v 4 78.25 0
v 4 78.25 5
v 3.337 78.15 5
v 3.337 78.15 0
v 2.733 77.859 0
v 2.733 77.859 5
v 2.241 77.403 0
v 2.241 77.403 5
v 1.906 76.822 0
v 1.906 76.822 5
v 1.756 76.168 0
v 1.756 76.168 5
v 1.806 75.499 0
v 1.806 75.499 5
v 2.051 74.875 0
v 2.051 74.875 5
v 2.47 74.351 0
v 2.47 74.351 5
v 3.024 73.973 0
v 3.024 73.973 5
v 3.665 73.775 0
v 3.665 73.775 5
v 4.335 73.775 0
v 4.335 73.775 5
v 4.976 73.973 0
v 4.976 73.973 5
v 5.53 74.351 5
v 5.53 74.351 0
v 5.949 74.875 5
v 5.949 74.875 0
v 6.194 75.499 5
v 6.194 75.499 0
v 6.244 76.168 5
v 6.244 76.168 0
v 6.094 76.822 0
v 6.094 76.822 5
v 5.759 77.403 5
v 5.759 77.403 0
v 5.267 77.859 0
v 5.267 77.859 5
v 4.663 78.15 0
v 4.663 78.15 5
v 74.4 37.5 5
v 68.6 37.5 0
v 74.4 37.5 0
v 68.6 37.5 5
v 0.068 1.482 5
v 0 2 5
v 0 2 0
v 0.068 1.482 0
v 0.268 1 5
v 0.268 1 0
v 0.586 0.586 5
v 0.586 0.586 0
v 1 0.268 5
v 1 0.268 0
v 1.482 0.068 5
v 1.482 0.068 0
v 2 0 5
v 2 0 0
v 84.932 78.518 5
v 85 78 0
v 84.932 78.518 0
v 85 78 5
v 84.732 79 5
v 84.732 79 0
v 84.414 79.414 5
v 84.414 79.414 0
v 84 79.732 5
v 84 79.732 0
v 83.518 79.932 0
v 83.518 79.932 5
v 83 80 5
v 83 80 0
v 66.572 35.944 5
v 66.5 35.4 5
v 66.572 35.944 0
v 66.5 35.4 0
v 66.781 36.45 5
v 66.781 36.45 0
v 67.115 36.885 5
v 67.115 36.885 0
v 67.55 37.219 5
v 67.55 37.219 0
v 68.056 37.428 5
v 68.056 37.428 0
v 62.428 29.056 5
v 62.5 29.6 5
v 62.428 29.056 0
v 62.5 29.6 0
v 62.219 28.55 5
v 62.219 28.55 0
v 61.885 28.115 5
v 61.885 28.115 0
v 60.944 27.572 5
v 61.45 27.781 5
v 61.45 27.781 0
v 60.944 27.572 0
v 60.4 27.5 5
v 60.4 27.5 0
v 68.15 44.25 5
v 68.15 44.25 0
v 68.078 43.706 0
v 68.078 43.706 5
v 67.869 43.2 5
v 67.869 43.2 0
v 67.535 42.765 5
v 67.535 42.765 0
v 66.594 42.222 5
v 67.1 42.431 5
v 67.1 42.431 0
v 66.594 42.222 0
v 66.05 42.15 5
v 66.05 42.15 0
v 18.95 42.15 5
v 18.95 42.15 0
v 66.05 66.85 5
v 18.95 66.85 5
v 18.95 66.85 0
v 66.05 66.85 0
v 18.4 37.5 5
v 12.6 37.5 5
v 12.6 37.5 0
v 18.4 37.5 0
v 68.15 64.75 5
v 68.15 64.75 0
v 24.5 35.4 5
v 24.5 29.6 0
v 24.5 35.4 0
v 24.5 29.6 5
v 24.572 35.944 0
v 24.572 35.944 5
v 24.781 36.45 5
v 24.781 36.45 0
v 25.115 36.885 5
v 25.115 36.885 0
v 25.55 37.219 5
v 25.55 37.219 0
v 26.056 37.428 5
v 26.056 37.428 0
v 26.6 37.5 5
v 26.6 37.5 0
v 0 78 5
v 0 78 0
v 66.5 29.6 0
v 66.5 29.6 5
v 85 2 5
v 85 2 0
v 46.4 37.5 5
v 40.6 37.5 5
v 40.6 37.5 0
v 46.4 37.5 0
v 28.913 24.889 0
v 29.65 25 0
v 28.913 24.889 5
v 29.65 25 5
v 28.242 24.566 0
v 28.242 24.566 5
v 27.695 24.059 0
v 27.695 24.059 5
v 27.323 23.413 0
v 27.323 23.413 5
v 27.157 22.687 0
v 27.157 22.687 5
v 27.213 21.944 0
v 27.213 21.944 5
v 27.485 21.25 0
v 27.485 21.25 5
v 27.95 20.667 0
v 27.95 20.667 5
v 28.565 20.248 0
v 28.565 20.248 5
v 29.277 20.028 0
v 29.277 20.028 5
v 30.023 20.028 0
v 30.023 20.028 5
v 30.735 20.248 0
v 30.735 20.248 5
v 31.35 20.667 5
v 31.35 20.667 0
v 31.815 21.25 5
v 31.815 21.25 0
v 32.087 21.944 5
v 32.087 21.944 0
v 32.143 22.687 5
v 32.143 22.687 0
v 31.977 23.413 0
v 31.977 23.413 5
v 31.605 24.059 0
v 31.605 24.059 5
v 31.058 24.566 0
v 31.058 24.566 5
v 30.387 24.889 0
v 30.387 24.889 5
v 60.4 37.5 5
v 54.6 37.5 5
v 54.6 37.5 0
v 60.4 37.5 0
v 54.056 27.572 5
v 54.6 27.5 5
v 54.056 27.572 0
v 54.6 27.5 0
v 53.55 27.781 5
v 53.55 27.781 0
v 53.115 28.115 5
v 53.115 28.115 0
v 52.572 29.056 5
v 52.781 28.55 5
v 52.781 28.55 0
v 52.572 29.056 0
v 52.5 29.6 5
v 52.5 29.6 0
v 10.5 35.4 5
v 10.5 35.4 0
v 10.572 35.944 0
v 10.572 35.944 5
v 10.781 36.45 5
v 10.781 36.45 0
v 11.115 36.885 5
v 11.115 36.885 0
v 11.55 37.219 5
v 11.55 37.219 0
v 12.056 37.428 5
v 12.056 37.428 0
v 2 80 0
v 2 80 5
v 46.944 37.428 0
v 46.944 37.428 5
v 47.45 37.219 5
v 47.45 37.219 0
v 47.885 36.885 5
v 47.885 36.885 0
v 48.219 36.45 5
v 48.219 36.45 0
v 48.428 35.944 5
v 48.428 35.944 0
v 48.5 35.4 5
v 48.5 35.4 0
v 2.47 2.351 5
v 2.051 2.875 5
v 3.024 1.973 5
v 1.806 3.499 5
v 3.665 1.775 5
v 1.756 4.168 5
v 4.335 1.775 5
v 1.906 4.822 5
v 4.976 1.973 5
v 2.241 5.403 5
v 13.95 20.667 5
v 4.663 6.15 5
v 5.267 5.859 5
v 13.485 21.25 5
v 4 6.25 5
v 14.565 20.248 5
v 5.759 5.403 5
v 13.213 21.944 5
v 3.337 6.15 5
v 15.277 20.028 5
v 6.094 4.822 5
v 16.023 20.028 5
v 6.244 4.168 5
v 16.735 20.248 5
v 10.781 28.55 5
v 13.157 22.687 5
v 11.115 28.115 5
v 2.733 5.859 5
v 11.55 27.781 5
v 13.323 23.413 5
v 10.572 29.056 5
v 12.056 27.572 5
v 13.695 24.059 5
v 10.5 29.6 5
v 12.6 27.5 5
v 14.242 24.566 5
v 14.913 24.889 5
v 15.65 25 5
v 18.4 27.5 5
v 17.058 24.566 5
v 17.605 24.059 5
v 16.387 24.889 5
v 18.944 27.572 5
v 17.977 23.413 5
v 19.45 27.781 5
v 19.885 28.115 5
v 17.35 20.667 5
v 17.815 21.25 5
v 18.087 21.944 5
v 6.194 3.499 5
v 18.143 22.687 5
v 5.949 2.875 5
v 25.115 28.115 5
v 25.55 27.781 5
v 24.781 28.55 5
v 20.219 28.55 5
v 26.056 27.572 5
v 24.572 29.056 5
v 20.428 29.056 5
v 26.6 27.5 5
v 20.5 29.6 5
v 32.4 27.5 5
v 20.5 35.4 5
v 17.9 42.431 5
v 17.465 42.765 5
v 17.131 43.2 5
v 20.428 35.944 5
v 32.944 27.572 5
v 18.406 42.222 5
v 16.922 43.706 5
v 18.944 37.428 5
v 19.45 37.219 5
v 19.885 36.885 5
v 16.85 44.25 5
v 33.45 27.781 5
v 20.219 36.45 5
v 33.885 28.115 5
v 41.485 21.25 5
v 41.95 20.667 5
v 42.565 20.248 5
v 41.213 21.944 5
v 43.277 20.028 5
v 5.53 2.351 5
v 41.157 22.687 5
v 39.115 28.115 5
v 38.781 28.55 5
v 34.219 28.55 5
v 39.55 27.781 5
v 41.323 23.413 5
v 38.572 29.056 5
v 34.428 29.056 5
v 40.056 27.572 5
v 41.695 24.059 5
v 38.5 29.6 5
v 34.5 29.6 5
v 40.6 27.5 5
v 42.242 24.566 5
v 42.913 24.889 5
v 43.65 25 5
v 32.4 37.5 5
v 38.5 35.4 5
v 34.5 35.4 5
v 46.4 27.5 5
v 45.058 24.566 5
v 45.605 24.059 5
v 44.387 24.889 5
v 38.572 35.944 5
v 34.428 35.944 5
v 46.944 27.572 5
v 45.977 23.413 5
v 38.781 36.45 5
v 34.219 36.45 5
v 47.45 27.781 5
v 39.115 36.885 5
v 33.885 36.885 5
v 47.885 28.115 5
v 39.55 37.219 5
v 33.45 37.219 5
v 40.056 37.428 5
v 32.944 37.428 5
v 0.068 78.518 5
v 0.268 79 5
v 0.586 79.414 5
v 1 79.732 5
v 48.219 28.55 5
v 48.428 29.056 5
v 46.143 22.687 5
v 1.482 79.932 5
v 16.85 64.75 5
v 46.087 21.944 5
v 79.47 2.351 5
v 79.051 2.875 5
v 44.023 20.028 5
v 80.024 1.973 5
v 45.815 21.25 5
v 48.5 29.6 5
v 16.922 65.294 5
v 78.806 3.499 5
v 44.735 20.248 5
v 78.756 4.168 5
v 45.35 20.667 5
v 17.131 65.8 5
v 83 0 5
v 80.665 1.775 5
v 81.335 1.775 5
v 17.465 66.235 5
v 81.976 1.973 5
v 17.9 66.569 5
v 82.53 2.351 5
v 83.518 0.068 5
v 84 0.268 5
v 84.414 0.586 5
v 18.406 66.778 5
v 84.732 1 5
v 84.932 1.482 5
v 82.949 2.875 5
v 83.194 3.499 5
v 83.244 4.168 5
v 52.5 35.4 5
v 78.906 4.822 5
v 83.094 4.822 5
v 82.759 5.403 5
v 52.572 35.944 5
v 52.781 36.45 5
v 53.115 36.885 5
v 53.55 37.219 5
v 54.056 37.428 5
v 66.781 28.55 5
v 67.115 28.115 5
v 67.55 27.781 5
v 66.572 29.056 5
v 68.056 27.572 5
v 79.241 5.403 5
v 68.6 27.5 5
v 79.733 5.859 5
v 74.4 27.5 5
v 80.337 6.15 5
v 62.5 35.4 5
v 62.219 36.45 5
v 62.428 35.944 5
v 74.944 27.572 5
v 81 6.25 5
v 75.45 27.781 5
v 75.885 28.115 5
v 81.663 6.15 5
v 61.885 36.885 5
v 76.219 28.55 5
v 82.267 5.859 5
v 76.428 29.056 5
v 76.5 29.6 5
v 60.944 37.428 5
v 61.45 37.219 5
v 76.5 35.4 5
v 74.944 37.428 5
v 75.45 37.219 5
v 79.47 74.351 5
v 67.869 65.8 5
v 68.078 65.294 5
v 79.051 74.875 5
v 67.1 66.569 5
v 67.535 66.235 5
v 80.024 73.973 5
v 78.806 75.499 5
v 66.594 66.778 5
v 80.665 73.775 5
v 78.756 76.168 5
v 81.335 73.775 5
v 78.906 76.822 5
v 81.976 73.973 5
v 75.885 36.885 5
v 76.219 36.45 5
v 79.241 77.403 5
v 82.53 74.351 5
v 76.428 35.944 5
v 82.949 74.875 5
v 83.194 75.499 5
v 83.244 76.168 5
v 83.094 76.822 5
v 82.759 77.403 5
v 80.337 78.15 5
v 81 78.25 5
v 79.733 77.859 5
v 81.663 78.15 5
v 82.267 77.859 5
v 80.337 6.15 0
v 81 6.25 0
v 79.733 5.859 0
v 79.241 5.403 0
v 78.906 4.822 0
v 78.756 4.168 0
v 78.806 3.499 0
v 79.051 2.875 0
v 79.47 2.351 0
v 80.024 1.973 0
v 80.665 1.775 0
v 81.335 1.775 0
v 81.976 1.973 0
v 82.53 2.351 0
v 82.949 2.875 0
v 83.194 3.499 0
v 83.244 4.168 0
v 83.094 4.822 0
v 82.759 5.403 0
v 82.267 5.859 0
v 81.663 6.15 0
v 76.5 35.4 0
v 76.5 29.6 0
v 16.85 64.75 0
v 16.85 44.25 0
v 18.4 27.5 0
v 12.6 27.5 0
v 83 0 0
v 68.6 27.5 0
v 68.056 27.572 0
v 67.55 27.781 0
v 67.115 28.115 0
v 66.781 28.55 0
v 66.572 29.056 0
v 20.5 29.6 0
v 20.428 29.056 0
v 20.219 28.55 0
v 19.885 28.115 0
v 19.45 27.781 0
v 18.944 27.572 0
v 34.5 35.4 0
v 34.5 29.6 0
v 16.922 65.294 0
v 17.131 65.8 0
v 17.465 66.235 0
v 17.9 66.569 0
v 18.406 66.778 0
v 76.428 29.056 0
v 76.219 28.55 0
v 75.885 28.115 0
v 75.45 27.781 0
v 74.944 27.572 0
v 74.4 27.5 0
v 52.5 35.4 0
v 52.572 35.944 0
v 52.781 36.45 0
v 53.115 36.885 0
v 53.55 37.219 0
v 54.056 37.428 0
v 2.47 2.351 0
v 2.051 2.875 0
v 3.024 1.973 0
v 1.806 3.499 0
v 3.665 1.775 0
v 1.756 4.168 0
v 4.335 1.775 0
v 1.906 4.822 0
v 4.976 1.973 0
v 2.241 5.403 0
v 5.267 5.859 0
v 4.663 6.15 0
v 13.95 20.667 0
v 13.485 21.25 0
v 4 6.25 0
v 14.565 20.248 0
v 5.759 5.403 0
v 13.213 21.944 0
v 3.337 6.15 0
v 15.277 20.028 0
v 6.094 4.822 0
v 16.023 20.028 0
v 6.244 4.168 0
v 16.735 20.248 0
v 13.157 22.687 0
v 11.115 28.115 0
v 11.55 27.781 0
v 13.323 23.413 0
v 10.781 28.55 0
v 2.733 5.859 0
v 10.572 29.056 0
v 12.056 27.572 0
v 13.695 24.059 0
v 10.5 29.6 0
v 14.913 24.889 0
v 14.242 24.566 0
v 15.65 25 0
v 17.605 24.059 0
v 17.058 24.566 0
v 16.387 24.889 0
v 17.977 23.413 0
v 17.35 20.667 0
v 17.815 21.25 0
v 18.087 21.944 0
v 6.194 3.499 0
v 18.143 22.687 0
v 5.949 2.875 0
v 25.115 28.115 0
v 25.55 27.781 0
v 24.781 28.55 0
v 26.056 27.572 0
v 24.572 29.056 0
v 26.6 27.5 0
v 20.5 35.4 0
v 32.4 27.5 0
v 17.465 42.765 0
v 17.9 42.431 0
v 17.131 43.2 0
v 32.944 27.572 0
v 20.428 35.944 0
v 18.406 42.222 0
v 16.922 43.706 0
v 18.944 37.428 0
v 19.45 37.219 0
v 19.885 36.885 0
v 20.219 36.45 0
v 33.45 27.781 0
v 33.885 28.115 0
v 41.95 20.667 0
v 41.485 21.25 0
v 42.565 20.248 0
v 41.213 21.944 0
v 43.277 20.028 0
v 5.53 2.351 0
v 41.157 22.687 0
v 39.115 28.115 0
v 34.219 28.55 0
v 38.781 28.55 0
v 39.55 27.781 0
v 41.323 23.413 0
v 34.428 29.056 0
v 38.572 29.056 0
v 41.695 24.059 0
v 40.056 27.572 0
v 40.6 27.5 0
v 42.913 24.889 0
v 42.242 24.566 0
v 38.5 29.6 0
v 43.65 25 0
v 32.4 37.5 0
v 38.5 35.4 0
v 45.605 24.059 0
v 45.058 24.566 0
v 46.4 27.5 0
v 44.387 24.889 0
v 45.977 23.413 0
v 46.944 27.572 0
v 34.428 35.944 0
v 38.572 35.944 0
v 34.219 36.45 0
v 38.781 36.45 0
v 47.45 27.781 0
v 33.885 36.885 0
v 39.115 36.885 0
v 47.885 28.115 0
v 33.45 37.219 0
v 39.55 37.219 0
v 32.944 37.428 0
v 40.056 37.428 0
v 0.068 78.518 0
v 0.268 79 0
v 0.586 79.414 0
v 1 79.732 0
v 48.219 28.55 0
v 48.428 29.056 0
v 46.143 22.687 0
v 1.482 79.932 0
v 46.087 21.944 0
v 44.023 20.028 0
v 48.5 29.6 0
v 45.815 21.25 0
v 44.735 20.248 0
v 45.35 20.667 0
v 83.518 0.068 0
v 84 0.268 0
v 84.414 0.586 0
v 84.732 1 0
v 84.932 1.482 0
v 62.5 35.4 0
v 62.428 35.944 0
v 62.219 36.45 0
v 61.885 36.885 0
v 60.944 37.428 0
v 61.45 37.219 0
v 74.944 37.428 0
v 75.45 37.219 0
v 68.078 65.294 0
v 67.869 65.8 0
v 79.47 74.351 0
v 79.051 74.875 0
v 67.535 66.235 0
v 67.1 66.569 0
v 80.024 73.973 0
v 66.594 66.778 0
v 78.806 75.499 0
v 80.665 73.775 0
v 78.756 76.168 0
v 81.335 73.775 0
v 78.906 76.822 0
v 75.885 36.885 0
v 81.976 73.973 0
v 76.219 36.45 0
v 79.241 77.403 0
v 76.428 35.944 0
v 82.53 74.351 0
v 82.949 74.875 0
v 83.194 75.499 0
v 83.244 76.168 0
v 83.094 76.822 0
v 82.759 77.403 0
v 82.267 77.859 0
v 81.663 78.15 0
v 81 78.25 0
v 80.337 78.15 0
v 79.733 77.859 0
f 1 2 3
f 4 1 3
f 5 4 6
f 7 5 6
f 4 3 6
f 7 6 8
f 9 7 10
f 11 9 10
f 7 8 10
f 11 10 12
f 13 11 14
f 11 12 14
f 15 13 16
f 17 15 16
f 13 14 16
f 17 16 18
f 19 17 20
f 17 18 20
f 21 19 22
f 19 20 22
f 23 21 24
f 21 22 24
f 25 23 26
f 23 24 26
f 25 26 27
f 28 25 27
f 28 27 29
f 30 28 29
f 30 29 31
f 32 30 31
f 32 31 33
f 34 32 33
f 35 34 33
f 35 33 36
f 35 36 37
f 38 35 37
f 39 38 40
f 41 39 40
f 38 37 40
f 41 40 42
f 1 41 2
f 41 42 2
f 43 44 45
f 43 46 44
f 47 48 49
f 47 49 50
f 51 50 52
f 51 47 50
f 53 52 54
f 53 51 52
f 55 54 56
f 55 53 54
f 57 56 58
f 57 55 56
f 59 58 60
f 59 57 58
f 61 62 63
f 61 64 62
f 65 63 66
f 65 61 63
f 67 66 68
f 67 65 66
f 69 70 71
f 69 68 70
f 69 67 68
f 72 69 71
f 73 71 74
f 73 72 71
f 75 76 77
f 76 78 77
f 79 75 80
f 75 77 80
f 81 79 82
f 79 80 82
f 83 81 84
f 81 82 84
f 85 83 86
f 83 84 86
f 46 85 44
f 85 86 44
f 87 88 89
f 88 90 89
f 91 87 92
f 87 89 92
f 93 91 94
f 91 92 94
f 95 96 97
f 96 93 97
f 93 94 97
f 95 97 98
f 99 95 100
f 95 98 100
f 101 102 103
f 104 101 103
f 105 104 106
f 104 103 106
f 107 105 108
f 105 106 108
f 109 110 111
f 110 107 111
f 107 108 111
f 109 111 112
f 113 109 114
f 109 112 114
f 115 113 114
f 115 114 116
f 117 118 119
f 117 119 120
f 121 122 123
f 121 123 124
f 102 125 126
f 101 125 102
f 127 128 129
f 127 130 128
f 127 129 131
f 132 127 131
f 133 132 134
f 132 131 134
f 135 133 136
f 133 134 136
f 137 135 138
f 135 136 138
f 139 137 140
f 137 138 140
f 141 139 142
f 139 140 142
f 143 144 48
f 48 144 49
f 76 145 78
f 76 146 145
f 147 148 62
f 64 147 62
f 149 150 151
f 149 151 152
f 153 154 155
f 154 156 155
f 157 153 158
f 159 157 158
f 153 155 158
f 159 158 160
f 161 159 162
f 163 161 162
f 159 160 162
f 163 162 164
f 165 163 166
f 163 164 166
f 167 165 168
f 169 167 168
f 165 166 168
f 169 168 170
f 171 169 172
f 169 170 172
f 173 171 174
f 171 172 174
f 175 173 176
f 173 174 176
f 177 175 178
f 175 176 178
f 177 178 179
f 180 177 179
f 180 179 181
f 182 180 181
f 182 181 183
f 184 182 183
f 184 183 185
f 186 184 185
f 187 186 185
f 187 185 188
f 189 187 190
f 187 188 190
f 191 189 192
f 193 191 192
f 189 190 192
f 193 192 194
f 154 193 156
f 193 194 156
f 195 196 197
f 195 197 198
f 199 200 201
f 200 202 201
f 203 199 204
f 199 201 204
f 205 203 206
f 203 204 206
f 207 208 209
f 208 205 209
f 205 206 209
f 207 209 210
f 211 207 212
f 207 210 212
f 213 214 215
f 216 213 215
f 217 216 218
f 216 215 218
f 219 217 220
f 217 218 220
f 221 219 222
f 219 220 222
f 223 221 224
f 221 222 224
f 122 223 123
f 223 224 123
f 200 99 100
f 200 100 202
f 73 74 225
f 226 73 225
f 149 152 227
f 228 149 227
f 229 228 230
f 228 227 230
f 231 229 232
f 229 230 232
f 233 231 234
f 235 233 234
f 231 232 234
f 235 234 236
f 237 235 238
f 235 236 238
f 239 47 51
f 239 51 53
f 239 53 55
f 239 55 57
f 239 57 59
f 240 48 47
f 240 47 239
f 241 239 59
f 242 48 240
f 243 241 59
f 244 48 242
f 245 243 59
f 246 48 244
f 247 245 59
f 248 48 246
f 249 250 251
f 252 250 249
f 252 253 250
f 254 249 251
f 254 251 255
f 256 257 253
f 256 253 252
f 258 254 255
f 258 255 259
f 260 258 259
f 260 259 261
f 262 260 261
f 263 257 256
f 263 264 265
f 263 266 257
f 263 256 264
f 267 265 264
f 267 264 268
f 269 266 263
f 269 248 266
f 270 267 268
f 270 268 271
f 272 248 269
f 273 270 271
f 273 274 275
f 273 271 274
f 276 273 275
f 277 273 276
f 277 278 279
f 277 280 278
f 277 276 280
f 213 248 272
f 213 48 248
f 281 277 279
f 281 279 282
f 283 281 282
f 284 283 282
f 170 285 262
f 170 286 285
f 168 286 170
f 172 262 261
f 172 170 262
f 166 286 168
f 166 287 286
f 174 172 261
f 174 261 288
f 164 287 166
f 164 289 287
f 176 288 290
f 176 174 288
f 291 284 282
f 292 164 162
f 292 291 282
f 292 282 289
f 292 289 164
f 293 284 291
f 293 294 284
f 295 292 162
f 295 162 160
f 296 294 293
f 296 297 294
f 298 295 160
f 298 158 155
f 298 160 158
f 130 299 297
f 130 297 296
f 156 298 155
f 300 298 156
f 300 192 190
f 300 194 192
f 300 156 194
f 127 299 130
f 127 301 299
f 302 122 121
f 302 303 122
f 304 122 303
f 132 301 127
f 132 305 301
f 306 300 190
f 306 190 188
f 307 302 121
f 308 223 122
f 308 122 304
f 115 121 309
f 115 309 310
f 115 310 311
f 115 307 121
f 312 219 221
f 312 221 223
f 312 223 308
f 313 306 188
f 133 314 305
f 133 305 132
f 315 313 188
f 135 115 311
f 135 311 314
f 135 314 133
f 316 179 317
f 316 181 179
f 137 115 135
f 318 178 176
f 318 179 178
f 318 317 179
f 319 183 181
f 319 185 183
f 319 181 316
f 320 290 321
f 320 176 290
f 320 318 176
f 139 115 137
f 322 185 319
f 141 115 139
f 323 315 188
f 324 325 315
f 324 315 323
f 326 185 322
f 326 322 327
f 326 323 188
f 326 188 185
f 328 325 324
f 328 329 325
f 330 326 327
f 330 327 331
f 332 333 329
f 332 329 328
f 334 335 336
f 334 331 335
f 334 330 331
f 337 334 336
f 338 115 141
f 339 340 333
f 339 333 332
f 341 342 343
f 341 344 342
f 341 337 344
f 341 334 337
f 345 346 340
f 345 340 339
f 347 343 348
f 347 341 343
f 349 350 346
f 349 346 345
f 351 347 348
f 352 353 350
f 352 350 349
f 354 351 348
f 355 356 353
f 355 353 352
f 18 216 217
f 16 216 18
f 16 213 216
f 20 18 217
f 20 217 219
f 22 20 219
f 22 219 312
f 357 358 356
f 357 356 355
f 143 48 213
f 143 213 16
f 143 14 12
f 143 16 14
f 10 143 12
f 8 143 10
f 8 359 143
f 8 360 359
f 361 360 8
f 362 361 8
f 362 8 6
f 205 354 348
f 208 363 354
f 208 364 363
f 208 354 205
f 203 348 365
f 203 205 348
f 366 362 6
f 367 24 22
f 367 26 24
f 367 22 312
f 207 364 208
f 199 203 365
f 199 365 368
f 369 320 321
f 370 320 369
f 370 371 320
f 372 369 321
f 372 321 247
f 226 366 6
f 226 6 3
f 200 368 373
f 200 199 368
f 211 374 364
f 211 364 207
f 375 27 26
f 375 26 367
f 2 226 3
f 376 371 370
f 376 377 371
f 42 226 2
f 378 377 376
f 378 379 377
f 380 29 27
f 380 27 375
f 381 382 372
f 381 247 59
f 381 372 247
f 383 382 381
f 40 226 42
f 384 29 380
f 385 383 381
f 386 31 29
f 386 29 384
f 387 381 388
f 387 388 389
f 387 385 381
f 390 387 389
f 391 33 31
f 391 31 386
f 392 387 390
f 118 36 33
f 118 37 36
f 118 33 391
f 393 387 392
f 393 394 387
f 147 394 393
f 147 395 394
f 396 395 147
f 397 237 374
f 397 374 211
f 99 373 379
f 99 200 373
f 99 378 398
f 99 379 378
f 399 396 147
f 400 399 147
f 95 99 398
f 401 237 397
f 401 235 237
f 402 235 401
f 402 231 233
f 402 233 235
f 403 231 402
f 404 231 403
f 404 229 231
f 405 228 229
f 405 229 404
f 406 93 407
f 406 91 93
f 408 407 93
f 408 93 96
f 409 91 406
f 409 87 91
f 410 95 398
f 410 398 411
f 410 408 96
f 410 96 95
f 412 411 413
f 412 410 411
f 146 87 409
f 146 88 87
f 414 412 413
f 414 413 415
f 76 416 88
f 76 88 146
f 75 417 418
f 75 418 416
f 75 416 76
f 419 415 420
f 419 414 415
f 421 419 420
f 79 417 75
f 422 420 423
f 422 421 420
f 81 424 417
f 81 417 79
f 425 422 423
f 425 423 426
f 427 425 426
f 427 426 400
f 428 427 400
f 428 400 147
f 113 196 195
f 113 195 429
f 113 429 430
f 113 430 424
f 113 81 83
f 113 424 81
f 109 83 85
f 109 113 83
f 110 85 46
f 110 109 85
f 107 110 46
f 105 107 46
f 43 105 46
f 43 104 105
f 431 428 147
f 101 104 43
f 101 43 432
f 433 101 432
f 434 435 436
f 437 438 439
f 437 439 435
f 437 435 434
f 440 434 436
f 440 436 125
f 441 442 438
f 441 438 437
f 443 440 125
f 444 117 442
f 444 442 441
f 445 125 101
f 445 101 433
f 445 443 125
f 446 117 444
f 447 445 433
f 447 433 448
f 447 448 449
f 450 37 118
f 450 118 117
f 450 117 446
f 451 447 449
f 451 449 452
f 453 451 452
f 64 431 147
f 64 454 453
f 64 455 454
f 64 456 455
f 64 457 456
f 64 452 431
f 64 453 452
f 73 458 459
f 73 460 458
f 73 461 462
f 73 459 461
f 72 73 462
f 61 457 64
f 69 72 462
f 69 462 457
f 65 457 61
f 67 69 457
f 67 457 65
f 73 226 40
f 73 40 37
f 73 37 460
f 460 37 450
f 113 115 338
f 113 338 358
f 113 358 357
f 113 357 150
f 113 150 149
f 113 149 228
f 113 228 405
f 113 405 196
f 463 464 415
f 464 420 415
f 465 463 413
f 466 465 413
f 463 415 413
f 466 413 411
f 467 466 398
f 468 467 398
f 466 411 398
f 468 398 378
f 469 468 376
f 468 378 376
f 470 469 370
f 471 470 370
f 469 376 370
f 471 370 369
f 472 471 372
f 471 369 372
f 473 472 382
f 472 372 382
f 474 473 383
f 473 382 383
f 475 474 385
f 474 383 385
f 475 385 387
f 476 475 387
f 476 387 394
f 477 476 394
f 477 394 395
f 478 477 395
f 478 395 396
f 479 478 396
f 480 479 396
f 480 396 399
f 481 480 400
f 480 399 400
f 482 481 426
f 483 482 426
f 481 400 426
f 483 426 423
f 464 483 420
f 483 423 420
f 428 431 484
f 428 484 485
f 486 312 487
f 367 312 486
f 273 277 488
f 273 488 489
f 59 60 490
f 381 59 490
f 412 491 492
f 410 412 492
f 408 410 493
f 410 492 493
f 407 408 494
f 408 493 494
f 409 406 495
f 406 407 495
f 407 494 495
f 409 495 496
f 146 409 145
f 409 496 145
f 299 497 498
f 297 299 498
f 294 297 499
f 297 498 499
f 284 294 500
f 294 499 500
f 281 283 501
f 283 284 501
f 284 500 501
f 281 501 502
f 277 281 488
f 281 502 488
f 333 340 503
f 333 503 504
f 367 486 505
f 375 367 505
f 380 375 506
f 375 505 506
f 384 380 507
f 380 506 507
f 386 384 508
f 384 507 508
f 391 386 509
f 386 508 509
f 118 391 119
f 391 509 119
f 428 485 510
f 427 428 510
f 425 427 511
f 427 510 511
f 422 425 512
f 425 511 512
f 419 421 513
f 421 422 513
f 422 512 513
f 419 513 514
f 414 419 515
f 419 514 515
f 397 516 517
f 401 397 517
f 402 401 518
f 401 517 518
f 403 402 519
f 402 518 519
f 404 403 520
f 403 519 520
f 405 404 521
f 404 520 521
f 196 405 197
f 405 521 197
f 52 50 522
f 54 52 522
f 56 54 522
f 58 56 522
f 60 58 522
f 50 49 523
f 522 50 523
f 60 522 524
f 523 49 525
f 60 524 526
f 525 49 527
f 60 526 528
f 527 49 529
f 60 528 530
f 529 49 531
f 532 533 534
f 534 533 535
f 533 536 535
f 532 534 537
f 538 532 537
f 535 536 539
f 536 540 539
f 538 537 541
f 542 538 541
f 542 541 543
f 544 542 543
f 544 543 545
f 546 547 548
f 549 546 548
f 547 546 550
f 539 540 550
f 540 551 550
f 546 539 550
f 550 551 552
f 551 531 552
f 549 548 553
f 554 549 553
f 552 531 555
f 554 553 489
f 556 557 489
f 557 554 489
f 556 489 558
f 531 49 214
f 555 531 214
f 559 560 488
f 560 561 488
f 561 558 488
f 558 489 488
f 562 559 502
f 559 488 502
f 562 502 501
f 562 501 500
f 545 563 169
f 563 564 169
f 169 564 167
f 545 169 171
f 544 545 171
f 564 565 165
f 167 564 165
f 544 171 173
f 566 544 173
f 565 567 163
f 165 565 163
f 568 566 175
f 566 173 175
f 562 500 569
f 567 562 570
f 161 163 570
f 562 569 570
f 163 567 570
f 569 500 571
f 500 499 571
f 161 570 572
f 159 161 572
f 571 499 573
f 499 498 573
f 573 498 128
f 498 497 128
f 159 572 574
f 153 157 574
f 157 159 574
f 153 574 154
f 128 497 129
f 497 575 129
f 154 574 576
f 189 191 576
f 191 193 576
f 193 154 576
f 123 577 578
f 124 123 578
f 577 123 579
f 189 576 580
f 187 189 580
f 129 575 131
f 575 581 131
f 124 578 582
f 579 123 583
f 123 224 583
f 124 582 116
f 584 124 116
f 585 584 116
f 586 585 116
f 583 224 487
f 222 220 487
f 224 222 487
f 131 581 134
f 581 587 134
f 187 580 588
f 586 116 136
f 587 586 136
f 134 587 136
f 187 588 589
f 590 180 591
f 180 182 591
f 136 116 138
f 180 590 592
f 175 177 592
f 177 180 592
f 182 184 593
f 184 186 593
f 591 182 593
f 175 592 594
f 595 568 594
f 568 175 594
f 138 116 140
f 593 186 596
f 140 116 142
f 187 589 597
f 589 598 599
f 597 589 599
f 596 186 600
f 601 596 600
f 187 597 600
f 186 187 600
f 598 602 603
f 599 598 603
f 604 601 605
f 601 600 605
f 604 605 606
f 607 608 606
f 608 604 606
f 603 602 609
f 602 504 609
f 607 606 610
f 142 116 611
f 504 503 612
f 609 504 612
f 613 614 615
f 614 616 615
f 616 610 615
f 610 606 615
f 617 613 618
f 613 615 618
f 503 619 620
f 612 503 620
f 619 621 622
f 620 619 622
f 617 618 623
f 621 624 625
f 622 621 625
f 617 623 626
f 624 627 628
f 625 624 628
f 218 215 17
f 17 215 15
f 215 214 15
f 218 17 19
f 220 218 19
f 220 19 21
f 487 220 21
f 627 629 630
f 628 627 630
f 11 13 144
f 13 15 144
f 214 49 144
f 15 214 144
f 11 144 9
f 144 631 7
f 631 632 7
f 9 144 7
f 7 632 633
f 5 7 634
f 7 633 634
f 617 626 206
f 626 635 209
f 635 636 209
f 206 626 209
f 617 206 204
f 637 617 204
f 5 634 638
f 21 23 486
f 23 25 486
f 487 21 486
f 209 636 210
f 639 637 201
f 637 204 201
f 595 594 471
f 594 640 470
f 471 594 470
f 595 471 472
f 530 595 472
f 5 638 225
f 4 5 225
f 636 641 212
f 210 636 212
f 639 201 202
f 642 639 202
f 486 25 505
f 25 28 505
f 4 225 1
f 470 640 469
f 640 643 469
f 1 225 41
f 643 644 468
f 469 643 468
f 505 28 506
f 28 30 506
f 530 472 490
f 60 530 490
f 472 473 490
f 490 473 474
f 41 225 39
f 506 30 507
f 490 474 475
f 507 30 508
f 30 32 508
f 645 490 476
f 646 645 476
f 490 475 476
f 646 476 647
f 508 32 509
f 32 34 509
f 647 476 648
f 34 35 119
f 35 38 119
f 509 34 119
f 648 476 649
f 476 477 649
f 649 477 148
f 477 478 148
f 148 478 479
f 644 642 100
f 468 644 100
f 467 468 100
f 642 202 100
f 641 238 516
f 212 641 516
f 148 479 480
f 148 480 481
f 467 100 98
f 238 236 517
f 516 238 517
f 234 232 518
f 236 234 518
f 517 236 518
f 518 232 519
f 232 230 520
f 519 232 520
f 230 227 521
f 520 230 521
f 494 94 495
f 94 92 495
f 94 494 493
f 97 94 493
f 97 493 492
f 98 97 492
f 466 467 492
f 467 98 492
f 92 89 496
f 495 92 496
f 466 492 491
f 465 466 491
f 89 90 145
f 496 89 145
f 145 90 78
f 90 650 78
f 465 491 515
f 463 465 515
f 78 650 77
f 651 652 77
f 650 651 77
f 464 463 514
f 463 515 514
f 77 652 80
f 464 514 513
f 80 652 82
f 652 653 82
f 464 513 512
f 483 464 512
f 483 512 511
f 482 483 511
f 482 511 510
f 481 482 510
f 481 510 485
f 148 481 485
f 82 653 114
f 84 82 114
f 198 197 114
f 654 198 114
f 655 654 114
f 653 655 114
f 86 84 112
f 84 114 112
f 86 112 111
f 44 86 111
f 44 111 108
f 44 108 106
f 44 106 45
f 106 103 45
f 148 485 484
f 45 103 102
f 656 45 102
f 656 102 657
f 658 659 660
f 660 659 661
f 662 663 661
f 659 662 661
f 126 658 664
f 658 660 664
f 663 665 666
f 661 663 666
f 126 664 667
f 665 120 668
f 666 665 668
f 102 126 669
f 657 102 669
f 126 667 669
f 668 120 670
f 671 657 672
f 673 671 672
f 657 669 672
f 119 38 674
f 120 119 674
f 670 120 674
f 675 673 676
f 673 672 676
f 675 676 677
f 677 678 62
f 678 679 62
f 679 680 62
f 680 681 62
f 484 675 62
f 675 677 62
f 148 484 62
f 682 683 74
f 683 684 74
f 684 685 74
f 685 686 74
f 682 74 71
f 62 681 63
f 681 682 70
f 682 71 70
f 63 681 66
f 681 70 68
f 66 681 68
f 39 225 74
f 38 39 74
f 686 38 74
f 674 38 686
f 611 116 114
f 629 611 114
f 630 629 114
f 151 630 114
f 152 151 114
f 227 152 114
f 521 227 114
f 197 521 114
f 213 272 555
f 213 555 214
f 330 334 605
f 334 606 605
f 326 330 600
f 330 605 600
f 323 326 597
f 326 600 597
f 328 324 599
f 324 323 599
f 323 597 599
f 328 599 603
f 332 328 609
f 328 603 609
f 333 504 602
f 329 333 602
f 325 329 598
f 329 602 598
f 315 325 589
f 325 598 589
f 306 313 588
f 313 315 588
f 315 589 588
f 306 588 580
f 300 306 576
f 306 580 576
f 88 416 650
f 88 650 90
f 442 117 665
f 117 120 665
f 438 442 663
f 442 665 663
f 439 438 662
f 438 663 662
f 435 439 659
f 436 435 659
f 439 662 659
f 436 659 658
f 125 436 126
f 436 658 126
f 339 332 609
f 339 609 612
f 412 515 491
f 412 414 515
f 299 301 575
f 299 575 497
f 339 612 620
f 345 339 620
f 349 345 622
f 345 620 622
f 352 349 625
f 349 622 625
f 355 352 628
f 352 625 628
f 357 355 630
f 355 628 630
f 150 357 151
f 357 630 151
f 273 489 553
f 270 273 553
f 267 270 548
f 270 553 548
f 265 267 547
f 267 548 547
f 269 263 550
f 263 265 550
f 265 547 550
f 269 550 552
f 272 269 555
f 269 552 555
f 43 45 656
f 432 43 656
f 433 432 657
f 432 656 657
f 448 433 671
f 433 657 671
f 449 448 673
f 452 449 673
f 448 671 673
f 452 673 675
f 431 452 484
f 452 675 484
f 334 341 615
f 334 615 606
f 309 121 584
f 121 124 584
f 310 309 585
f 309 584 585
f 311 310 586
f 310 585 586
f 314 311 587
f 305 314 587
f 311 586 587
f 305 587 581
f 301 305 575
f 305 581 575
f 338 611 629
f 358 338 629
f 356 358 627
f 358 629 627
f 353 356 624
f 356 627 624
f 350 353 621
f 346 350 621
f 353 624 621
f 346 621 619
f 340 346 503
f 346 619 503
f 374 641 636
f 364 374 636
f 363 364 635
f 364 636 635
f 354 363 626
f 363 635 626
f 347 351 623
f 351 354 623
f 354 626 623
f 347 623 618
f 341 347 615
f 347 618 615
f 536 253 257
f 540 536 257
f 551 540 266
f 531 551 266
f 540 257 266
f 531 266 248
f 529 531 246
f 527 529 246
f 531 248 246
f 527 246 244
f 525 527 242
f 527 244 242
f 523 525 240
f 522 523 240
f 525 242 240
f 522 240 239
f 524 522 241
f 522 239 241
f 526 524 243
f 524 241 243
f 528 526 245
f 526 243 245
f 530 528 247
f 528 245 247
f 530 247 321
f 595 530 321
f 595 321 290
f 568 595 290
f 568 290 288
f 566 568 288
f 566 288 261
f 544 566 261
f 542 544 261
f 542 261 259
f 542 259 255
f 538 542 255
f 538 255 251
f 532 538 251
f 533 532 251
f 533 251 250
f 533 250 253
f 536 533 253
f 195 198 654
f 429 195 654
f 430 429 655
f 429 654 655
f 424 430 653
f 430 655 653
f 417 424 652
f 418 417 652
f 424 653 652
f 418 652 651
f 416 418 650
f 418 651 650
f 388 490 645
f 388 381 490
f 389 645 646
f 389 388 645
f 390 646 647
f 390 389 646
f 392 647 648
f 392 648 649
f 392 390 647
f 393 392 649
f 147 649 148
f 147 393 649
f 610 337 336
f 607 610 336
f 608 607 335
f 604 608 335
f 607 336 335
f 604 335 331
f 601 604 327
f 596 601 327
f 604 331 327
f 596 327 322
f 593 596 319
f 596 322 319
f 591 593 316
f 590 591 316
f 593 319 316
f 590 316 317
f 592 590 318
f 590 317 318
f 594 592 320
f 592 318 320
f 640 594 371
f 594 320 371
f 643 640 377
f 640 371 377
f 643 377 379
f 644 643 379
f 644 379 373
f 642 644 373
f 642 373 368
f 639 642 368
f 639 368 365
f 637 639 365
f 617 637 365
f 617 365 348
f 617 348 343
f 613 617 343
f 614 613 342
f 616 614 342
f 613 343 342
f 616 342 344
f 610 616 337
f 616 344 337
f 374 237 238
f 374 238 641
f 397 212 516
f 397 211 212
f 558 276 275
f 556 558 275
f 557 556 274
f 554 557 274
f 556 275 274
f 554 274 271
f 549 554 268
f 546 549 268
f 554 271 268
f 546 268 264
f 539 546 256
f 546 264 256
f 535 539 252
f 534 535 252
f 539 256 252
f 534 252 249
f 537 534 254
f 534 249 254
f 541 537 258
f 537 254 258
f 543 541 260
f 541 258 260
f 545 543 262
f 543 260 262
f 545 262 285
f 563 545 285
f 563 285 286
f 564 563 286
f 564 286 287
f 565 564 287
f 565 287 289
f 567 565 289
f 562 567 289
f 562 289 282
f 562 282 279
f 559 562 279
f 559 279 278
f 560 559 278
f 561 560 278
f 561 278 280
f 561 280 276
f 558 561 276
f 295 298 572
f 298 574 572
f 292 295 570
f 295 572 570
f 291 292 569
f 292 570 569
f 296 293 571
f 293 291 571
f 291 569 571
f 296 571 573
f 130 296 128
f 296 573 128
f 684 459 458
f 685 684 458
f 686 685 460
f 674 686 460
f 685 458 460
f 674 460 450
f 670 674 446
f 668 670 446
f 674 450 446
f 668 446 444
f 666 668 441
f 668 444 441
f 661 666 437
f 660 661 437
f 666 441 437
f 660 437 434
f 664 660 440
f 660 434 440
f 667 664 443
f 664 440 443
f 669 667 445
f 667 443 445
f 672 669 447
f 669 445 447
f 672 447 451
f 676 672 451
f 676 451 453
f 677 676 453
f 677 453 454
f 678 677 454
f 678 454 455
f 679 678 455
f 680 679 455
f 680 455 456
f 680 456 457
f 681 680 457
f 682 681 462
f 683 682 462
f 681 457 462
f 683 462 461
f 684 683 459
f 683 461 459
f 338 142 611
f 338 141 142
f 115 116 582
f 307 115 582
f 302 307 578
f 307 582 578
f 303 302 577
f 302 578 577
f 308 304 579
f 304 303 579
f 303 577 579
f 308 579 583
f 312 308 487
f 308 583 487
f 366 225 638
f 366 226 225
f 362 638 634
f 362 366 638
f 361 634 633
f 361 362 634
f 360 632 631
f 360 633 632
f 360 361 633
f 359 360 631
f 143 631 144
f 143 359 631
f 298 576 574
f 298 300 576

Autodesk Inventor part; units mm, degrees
ref_plane "YZ Plane" through (0, 0, 0) normal (1, 0, 0) x (0, 1, 0)
ref_plane "XZ Plane" through (0, 0, 0) normal (0, 1, 0) x (-1, 0, 0)
ref_plane "XY Plane" through (0, 0, 0) normal (0, 0, 1) x (1, 0, 0)
sketch "Skizze1" plane through (0, 0, 0) normal (0, 0, 1) x (1, 0, 0)
  line L0 (0, 0) -> (85, 0)
  line L1 (85, 0) -> (85, 80)
  line L2 (85, 80) -> (0, 80)
  line L3 (0, 80) -> (0, 0)
  dimension "d0" = 85
  dimension "d1" = 80
extrude "Extrusion1" add sketch "Skizze1" along normal blind 5
sketch "Skizze3" plane through (0, 0, 5) normal (0, 0, 1) x (1, 0, 0)
  line L0 (7.5, 71) -> (77.5, 71)
  line L1 (77.5, 71) -> (77.5, 9)
  line L2 (77.5, 9) -> (7.5, 9)
  line L3 (7.5, 9) -> (7.5, 71)
  line L4 (85, 80) -> (0, 80) projected
  line L5 (85, 0) -> (85, 80) projected
  line L6 (16.85, 66.85) -> (68.15, 66.85)
  line L7 (68.15, 66.85) -> (68.15, 42.15)
  line L8 (68.15, 42.15) -> (16.85, 42.15)
  line L9 (16.85, 42.15) -> (16.85, 66.85)
  line L10 (10.5, 37.5) -> (20.5, 37.5)
  line L11 (20.5, 37.5) -> (20.5, 27.5)
  line L12 (20.5, 27.5) -> (10.5, 27.5)
  line L13 (10.5, 27.5) -> (10.5, 37.5)
  line L14 (15.5, 37.5) -> (15.5, 27.5)
  line L15 (10.5, 32.5) -> (20.5, 32.5)
  line L16 (24.5, 37.5) -> (34.5, 37.5)
  line L17 (34.5, 37.5) -> (34.5, 27.5)
  line L18 (34.5, 27.5) -> (24.5, 27.5)
  line L19 (24.5, 27.5) -> (24.5, 37.5)
  line L20 (38.5, 37.5) -> (48.5, 37.5)
  line L21 (48.5, 37.5) -> (48.5, 27.5)
  line L22 (48.5, 27.5) -> (38.5, 27.5)
  line L23 (38.5, 27.5) -> (38.5, 37.5)
  line L24 (52.5, 37.5) -> (62.5, 37.5)
  line L25 (62.5, 37.5) -> (62.5, 27.5)
  line L26 (62.5, 27.5) -> (52.5, 27.5)
  line L27 (52.5, 27.5) -> (52.5, 37.5)
  line L28 (66.5, 37.5) -> (76.5, 37.5)
  line L29 (76.5, 37.5) -> (76.5, 27.5)
  line L30 (76.5, 27.5) -> (66.5, 27.5)
  line L31 (66.5, 27.5) -> (66.5, 37.5)
  point P0 (0, 0)
  point P1 (77.5, 40)
  point P2 (85, 40)
  point P3 (42.5, 71)
  point P4 (42.5, 80)
  point P5 (42.5, 66.85)
  dimension "d9" = 70
  dimension "d10" = 62
  dimension "d12" = 51.3
  dimension "d13" = 24.7
  dimension "d14" = 4.15
  dimension "d15" = 10
  dimension "d16" = 10
  dimension "d21" = 8
  dimension "d22" = 23.5
  dimension "d23" = 14
  dimension "d24" = 14
  dimension "d25" = 14
  dimension "d26" = 14
extrude "Extrusion3" cut sketch "Skizze3" against normal through all contours L6 L7 L8 L9 | L10 L14 L15 L13 | L10 L11 L15 L14 | L15 L14 L12 L13 | L15 L11 L12 L14 | L16 L17 L18 L19 | L20 L21 L22 L23 | L24 L25 L26 L27 | L28 L29 L30 L31
sketch "Skizze5" plane through (0, 0, 0) normal (0, 0, -1) x (-1, 0, 0)
  line L0 (-20.5, 27.5) -> (-20.5, 37.5) projected
  line L1 (-20.5, 37.5) -> (-10.5, 37.5) projected
  line L2 (-10.5, 37.5) -> (-10.5, 27.5) projected
  line L3 (-10.5, 27.5) -> (-20.5, 27.5) projected
  line L4 (-66.5, 37.5) -> (-66.5, 27.5) projected
  line L5 (-66.5, 27.5) -> (-76.5, 27.5) projected
  line L6 (-76.5, 27.5) -> (-76.5, 37.5) projected
  line L7 (-76.5, 37.5) -> (-66.5, 37.5) projected
  line L8 (-38.5, 37.5) -> (-38.5, 27.5) projected
  line L9 (-38.5, 27.5) -> (-48.5, 27.5) projected
  line L10 (-48.5, 27.5) -> (-48.5, 37.5) projected
  line L11 (-48.5, 37.5) -> (-38.5, 37.5) projected
  line L12 (-24.5, 37.5) -> (-24.5, 27.5) projected
  line L13 (-24.5, 27.5) -> (-34.5, 27.5) projected
  line L14 (-34.5, 27.5) -> (-34.5, 37.5) projected
  line L15 (-34.5, 37.5) -> (-24.5, 37.5) projected
  line L16 (-52.5, 37.5) -> (-52.5, 27.5) projected
  line L17 (-52.5, 27.5) -> (-62.5, 27.5) projected
  line L18 (-62.5, 27.5) -> (-62.5, 37.5) projected
  line L19 (-62.5, 37.5) -> (-52.5, 37.5) projected
  line L20 (-16.85, 66.85) -> (-16.85, 42.15) projected
  line L21 (-16.85, 42.15) -> (-68.15, 42.15) projected
  line L22 (-68.15, 42.15) -> (-68.15, 66.85) projected
  line L23 (-68.15, 66.85) -> (-16.85, 66.85) projected
  line L24 (0, 0) -> (-85, 0) projected
  line L25 (0, 80) -> (0, 0) projected
  line L26 (-85, 80) -> (0, 80) projected
  line L27 (-85, 0) -> (-85, 80) projected
  line L28 (-4, 76) -> (-4, 4)
  line L29 (-4, 4) -> (-81, 4)
  line L30 (-81, 4) -> (-81, 76)
  line L31 (-81, 76) -> (-4, 76)
  line L32 (-85, 80) -> (0, 80) projected
  dimension "d39" = 4
hole "Bohrung2" at (4, 76, 0) at (4, 4, 0) at (81, 4, 0) at (81, 76, 0) direction (0, 0, 1) diameter 4.5 end through all
sketch "Skizze6" plane through (0, 0, 0) normal (0, 0, -1) x (-1, 0, 0)
  circle A0 centre (-15.65, 22.5) radius 2.45 projected
  circle A1 centre (-29.65, 22.5) radius 2.45 projected
  circle A2 centre (-43.65, 22.5) radius 2.45 projected
  point P0 (0, 0)
hole "Bohrung3" at (43.65, 22.5, 0) at (29.65, 22.5, 0) at (15.65, 22.5, 0) direction (0, 0, 1) diameter 5 end through all
fillet "Rundung2" radius 2 4 edges at (85, 0, 2.5) (0, 0, 2.5) (0, 80, 2.5) (85, 80, 2.5)
fillet "Rundung1" radius 2.1 24 edges at (10.5, 37.5, 2.5) (10.5, 27.5, 2.5) (20.5, 27.5, 2.5) (20.5, 37.5, 2.5) (24.5, 37.5, 2.5) (24.5, 27.5, 2.5) (34.5, 27.5, 2.5) (34.5, 37.5, 2.5) (38.5, 37.5, 2.5) (48.5, 37.5, 2.5) (52.5, 37.5, 2.5) (62.5, 37.5, 2.5) (66.5, 37.5, 2.5) (76.5, 37.5, 2.5) (76.5, 27.5, 2.5) (66.5, 27.5, 2.5) (62.5, 27.5, 2.5) (52.5, 27.5, 2.5) (48.5, 27.5, 2.5) (38.5, 27.5, 2.5) (16.85, 42.15, 2.5) (16.85, 66.85, 2.5) (68.15, 66.85, 2.5) (68.15, 42.15, 2.5)
properties part number "Schiled"
